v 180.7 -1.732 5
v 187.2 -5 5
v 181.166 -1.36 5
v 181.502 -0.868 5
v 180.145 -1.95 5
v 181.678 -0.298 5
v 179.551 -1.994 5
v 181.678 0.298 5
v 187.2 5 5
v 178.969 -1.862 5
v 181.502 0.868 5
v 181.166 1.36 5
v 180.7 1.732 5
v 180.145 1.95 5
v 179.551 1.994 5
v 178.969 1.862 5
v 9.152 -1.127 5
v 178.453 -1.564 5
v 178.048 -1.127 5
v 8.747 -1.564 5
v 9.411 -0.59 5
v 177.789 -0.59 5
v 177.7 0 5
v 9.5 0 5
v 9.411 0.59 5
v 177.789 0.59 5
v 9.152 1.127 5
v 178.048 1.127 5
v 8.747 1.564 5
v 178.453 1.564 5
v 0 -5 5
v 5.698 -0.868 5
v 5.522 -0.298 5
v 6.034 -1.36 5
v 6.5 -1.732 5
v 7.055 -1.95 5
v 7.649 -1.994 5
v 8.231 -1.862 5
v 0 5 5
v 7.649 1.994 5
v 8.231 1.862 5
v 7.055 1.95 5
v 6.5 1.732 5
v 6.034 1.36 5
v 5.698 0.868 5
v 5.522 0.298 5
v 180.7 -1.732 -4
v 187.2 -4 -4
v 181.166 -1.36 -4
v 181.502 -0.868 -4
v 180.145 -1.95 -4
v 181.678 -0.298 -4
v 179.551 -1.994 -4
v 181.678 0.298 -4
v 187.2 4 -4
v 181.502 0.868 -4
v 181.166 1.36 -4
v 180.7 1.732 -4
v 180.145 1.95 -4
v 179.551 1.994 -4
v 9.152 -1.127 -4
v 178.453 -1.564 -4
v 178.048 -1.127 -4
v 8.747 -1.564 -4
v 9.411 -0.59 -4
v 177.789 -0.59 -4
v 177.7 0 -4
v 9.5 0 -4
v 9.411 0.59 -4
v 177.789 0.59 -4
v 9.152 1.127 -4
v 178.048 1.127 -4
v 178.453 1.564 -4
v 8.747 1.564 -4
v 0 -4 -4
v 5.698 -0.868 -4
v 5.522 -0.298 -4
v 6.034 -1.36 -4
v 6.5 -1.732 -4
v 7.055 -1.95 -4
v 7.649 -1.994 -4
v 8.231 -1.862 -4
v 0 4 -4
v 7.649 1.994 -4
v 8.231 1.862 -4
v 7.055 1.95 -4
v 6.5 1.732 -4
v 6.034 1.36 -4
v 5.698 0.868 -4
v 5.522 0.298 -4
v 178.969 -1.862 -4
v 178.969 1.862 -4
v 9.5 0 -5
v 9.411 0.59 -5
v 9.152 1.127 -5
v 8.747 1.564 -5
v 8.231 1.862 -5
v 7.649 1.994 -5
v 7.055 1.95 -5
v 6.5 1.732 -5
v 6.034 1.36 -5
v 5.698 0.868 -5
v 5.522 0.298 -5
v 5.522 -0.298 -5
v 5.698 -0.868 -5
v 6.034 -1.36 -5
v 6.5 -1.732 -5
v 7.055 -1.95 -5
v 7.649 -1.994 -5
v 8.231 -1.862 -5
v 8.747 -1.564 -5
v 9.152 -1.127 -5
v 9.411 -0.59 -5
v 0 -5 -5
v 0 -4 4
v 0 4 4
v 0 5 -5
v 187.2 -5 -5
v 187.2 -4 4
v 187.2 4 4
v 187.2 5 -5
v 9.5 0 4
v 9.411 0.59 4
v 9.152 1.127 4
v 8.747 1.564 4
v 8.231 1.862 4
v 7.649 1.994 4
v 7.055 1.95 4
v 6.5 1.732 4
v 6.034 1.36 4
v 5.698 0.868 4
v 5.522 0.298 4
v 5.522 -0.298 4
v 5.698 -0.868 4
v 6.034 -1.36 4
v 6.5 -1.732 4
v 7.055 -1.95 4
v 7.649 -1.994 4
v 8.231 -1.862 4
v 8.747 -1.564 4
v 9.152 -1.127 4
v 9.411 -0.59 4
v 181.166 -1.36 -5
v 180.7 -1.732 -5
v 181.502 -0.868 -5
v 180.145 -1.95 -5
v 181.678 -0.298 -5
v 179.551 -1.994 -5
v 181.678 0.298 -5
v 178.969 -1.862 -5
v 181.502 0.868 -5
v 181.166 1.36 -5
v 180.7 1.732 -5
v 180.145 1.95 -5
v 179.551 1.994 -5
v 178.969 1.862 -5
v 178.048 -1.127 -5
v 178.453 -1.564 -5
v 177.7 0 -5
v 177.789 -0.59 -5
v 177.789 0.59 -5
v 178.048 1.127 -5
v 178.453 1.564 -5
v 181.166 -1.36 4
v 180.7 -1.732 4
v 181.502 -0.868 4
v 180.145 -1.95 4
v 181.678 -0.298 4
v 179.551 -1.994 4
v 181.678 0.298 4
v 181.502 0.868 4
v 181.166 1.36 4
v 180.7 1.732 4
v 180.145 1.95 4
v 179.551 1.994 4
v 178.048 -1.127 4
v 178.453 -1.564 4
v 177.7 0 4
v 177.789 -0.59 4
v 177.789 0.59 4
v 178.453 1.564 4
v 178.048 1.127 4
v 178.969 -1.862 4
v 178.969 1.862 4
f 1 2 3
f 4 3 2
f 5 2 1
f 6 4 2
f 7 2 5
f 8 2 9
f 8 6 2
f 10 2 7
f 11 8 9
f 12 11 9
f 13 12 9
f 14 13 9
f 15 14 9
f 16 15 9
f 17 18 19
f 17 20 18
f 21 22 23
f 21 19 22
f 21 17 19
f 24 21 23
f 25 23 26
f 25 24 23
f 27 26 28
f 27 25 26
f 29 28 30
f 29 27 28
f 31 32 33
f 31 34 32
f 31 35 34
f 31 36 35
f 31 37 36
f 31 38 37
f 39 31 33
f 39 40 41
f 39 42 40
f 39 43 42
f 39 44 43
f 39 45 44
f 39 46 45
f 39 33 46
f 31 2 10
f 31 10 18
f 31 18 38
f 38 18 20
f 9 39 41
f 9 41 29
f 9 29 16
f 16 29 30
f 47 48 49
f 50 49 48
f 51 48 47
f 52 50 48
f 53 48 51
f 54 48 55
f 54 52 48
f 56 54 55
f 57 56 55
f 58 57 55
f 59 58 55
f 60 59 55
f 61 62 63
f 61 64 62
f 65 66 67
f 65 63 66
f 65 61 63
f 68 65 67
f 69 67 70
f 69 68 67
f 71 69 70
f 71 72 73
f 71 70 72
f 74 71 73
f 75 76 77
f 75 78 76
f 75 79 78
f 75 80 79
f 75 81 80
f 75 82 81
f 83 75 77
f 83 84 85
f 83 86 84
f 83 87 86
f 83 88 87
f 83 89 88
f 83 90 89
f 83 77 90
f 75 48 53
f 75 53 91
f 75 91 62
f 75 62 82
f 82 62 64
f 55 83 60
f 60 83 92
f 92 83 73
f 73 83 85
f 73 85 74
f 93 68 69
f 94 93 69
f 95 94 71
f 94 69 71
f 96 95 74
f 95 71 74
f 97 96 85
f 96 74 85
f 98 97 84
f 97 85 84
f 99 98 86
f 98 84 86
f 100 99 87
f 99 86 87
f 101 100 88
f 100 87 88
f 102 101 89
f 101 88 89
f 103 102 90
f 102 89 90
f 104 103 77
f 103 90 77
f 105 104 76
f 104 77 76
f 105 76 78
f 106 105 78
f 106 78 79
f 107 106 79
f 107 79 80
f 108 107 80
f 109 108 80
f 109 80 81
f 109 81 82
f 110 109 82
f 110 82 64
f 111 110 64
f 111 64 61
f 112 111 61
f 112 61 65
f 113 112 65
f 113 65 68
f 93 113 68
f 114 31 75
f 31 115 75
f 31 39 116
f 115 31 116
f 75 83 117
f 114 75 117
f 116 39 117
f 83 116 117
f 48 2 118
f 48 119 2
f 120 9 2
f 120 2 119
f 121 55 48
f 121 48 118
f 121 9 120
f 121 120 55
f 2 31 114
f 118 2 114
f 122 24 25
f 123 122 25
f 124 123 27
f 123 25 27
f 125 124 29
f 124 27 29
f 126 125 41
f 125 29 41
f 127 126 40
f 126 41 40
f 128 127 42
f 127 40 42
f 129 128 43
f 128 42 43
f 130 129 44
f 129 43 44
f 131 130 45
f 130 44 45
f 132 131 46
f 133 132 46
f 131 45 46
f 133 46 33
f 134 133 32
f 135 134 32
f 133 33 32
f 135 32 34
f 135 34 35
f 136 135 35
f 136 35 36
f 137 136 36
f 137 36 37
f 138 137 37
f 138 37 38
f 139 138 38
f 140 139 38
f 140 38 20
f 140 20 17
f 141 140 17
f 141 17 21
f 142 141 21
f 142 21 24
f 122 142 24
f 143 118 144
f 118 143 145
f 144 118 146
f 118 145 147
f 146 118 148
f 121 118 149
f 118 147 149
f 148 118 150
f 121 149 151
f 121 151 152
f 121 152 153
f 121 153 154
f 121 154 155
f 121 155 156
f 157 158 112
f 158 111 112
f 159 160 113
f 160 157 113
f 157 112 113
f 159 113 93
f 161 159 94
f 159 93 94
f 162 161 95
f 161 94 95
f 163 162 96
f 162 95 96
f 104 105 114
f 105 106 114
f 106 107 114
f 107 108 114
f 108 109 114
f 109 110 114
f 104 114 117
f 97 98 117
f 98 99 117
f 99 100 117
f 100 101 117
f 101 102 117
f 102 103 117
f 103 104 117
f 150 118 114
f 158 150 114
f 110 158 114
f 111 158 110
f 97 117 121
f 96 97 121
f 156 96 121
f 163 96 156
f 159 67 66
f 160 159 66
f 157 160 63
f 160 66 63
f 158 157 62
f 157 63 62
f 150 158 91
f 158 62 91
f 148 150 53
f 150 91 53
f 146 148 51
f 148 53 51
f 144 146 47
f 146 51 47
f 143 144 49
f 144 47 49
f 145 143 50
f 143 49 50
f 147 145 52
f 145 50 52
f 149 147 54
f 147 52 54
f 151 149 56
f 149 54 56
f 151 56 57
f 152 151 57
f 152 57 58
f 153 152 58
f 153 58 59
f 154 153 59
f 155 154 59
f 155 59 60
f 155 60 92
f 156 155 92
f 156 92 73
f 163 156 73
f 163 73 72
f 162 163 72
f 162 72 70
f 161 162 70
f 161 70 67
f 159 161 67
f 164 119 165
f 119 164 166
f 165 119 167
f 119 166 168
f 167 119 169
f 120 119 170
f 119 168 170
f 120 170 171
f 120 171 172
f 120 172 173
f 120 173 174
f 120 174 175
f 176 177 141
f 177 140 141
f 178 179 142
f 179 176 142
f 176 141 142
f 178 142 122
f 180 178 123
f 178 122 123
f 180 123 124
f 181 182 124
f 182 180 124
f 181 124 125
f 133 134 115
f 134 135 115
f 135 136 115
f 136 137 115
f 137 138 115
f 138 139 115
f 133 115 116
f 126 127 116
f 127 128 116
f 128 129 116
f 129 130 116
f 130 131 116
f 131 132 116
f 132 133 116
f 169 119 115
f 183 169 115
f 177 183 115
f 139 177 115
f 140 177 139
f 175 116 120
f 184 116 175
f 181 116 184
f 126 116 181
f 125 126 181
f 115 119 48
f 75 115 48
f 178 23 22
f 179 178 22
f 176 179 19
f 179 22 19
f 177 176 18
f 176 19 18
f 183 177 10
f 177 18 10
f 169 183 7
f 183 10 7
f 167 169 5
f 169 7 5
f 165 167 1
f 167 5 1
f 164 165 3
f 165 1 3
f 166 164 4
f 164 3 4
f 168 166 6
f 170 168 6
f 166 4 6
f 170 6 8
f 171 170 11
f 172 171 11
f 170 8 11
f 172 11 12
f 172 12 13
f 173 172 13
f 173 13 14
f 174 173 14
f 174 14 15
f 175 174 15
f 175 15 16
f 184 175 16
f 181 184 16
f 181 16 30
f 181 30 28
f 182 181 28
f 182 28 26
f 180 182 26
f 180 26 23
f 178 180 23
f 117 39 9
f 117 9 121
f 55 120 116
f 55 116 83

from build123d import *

# Parameters (mm, degrees)
SKETCH_1_W          = 10
SKETCH_1_H          = 10
SKETCH_1_W_2        = 8
SKETCH_1_H_2        = 8
EXTRUDE_1_DEPTH     = 187.2
SKETCH_2_R          = 2
CUT_EXTRUDE_1_DEPTH = 188.533570328


with BuildPart() as part:
    # ｽｹｯﾁ1 → 押し出し-薄板1 (new body)
    with BuildSketch(Plane(origin=(0, 0, 0), x_dir=(0, 0, -1), z_dir=(1, 0, 0))):
        Rectangle(SKETCH_1_W, SKETCH_1_H)
        Rectangle(SKETCH_1_W_2, SKETCH_1_H_2, mode=Mode.SUBTRACT)
    extrude(amount=EXTRUDE_1_DEPTH)

    # ｽｹｯﾁ2 → ｶｯﾄ - 押し出し1 (cut, through all)
    with BuildSketch(Plane.XY.offset(5)):
        with Locations((7.5, 0)):
            Circle(SKETCH_2_R)
        with Locations(Location((179.7, 0, 0), (0, 0, 180))):
            Circle(SKETCH_2_R)
    extrude(amount=-CUT_EXTRUDE_1_DEPTH, mode=Mode.SUBTRACT)


solid = part.part
